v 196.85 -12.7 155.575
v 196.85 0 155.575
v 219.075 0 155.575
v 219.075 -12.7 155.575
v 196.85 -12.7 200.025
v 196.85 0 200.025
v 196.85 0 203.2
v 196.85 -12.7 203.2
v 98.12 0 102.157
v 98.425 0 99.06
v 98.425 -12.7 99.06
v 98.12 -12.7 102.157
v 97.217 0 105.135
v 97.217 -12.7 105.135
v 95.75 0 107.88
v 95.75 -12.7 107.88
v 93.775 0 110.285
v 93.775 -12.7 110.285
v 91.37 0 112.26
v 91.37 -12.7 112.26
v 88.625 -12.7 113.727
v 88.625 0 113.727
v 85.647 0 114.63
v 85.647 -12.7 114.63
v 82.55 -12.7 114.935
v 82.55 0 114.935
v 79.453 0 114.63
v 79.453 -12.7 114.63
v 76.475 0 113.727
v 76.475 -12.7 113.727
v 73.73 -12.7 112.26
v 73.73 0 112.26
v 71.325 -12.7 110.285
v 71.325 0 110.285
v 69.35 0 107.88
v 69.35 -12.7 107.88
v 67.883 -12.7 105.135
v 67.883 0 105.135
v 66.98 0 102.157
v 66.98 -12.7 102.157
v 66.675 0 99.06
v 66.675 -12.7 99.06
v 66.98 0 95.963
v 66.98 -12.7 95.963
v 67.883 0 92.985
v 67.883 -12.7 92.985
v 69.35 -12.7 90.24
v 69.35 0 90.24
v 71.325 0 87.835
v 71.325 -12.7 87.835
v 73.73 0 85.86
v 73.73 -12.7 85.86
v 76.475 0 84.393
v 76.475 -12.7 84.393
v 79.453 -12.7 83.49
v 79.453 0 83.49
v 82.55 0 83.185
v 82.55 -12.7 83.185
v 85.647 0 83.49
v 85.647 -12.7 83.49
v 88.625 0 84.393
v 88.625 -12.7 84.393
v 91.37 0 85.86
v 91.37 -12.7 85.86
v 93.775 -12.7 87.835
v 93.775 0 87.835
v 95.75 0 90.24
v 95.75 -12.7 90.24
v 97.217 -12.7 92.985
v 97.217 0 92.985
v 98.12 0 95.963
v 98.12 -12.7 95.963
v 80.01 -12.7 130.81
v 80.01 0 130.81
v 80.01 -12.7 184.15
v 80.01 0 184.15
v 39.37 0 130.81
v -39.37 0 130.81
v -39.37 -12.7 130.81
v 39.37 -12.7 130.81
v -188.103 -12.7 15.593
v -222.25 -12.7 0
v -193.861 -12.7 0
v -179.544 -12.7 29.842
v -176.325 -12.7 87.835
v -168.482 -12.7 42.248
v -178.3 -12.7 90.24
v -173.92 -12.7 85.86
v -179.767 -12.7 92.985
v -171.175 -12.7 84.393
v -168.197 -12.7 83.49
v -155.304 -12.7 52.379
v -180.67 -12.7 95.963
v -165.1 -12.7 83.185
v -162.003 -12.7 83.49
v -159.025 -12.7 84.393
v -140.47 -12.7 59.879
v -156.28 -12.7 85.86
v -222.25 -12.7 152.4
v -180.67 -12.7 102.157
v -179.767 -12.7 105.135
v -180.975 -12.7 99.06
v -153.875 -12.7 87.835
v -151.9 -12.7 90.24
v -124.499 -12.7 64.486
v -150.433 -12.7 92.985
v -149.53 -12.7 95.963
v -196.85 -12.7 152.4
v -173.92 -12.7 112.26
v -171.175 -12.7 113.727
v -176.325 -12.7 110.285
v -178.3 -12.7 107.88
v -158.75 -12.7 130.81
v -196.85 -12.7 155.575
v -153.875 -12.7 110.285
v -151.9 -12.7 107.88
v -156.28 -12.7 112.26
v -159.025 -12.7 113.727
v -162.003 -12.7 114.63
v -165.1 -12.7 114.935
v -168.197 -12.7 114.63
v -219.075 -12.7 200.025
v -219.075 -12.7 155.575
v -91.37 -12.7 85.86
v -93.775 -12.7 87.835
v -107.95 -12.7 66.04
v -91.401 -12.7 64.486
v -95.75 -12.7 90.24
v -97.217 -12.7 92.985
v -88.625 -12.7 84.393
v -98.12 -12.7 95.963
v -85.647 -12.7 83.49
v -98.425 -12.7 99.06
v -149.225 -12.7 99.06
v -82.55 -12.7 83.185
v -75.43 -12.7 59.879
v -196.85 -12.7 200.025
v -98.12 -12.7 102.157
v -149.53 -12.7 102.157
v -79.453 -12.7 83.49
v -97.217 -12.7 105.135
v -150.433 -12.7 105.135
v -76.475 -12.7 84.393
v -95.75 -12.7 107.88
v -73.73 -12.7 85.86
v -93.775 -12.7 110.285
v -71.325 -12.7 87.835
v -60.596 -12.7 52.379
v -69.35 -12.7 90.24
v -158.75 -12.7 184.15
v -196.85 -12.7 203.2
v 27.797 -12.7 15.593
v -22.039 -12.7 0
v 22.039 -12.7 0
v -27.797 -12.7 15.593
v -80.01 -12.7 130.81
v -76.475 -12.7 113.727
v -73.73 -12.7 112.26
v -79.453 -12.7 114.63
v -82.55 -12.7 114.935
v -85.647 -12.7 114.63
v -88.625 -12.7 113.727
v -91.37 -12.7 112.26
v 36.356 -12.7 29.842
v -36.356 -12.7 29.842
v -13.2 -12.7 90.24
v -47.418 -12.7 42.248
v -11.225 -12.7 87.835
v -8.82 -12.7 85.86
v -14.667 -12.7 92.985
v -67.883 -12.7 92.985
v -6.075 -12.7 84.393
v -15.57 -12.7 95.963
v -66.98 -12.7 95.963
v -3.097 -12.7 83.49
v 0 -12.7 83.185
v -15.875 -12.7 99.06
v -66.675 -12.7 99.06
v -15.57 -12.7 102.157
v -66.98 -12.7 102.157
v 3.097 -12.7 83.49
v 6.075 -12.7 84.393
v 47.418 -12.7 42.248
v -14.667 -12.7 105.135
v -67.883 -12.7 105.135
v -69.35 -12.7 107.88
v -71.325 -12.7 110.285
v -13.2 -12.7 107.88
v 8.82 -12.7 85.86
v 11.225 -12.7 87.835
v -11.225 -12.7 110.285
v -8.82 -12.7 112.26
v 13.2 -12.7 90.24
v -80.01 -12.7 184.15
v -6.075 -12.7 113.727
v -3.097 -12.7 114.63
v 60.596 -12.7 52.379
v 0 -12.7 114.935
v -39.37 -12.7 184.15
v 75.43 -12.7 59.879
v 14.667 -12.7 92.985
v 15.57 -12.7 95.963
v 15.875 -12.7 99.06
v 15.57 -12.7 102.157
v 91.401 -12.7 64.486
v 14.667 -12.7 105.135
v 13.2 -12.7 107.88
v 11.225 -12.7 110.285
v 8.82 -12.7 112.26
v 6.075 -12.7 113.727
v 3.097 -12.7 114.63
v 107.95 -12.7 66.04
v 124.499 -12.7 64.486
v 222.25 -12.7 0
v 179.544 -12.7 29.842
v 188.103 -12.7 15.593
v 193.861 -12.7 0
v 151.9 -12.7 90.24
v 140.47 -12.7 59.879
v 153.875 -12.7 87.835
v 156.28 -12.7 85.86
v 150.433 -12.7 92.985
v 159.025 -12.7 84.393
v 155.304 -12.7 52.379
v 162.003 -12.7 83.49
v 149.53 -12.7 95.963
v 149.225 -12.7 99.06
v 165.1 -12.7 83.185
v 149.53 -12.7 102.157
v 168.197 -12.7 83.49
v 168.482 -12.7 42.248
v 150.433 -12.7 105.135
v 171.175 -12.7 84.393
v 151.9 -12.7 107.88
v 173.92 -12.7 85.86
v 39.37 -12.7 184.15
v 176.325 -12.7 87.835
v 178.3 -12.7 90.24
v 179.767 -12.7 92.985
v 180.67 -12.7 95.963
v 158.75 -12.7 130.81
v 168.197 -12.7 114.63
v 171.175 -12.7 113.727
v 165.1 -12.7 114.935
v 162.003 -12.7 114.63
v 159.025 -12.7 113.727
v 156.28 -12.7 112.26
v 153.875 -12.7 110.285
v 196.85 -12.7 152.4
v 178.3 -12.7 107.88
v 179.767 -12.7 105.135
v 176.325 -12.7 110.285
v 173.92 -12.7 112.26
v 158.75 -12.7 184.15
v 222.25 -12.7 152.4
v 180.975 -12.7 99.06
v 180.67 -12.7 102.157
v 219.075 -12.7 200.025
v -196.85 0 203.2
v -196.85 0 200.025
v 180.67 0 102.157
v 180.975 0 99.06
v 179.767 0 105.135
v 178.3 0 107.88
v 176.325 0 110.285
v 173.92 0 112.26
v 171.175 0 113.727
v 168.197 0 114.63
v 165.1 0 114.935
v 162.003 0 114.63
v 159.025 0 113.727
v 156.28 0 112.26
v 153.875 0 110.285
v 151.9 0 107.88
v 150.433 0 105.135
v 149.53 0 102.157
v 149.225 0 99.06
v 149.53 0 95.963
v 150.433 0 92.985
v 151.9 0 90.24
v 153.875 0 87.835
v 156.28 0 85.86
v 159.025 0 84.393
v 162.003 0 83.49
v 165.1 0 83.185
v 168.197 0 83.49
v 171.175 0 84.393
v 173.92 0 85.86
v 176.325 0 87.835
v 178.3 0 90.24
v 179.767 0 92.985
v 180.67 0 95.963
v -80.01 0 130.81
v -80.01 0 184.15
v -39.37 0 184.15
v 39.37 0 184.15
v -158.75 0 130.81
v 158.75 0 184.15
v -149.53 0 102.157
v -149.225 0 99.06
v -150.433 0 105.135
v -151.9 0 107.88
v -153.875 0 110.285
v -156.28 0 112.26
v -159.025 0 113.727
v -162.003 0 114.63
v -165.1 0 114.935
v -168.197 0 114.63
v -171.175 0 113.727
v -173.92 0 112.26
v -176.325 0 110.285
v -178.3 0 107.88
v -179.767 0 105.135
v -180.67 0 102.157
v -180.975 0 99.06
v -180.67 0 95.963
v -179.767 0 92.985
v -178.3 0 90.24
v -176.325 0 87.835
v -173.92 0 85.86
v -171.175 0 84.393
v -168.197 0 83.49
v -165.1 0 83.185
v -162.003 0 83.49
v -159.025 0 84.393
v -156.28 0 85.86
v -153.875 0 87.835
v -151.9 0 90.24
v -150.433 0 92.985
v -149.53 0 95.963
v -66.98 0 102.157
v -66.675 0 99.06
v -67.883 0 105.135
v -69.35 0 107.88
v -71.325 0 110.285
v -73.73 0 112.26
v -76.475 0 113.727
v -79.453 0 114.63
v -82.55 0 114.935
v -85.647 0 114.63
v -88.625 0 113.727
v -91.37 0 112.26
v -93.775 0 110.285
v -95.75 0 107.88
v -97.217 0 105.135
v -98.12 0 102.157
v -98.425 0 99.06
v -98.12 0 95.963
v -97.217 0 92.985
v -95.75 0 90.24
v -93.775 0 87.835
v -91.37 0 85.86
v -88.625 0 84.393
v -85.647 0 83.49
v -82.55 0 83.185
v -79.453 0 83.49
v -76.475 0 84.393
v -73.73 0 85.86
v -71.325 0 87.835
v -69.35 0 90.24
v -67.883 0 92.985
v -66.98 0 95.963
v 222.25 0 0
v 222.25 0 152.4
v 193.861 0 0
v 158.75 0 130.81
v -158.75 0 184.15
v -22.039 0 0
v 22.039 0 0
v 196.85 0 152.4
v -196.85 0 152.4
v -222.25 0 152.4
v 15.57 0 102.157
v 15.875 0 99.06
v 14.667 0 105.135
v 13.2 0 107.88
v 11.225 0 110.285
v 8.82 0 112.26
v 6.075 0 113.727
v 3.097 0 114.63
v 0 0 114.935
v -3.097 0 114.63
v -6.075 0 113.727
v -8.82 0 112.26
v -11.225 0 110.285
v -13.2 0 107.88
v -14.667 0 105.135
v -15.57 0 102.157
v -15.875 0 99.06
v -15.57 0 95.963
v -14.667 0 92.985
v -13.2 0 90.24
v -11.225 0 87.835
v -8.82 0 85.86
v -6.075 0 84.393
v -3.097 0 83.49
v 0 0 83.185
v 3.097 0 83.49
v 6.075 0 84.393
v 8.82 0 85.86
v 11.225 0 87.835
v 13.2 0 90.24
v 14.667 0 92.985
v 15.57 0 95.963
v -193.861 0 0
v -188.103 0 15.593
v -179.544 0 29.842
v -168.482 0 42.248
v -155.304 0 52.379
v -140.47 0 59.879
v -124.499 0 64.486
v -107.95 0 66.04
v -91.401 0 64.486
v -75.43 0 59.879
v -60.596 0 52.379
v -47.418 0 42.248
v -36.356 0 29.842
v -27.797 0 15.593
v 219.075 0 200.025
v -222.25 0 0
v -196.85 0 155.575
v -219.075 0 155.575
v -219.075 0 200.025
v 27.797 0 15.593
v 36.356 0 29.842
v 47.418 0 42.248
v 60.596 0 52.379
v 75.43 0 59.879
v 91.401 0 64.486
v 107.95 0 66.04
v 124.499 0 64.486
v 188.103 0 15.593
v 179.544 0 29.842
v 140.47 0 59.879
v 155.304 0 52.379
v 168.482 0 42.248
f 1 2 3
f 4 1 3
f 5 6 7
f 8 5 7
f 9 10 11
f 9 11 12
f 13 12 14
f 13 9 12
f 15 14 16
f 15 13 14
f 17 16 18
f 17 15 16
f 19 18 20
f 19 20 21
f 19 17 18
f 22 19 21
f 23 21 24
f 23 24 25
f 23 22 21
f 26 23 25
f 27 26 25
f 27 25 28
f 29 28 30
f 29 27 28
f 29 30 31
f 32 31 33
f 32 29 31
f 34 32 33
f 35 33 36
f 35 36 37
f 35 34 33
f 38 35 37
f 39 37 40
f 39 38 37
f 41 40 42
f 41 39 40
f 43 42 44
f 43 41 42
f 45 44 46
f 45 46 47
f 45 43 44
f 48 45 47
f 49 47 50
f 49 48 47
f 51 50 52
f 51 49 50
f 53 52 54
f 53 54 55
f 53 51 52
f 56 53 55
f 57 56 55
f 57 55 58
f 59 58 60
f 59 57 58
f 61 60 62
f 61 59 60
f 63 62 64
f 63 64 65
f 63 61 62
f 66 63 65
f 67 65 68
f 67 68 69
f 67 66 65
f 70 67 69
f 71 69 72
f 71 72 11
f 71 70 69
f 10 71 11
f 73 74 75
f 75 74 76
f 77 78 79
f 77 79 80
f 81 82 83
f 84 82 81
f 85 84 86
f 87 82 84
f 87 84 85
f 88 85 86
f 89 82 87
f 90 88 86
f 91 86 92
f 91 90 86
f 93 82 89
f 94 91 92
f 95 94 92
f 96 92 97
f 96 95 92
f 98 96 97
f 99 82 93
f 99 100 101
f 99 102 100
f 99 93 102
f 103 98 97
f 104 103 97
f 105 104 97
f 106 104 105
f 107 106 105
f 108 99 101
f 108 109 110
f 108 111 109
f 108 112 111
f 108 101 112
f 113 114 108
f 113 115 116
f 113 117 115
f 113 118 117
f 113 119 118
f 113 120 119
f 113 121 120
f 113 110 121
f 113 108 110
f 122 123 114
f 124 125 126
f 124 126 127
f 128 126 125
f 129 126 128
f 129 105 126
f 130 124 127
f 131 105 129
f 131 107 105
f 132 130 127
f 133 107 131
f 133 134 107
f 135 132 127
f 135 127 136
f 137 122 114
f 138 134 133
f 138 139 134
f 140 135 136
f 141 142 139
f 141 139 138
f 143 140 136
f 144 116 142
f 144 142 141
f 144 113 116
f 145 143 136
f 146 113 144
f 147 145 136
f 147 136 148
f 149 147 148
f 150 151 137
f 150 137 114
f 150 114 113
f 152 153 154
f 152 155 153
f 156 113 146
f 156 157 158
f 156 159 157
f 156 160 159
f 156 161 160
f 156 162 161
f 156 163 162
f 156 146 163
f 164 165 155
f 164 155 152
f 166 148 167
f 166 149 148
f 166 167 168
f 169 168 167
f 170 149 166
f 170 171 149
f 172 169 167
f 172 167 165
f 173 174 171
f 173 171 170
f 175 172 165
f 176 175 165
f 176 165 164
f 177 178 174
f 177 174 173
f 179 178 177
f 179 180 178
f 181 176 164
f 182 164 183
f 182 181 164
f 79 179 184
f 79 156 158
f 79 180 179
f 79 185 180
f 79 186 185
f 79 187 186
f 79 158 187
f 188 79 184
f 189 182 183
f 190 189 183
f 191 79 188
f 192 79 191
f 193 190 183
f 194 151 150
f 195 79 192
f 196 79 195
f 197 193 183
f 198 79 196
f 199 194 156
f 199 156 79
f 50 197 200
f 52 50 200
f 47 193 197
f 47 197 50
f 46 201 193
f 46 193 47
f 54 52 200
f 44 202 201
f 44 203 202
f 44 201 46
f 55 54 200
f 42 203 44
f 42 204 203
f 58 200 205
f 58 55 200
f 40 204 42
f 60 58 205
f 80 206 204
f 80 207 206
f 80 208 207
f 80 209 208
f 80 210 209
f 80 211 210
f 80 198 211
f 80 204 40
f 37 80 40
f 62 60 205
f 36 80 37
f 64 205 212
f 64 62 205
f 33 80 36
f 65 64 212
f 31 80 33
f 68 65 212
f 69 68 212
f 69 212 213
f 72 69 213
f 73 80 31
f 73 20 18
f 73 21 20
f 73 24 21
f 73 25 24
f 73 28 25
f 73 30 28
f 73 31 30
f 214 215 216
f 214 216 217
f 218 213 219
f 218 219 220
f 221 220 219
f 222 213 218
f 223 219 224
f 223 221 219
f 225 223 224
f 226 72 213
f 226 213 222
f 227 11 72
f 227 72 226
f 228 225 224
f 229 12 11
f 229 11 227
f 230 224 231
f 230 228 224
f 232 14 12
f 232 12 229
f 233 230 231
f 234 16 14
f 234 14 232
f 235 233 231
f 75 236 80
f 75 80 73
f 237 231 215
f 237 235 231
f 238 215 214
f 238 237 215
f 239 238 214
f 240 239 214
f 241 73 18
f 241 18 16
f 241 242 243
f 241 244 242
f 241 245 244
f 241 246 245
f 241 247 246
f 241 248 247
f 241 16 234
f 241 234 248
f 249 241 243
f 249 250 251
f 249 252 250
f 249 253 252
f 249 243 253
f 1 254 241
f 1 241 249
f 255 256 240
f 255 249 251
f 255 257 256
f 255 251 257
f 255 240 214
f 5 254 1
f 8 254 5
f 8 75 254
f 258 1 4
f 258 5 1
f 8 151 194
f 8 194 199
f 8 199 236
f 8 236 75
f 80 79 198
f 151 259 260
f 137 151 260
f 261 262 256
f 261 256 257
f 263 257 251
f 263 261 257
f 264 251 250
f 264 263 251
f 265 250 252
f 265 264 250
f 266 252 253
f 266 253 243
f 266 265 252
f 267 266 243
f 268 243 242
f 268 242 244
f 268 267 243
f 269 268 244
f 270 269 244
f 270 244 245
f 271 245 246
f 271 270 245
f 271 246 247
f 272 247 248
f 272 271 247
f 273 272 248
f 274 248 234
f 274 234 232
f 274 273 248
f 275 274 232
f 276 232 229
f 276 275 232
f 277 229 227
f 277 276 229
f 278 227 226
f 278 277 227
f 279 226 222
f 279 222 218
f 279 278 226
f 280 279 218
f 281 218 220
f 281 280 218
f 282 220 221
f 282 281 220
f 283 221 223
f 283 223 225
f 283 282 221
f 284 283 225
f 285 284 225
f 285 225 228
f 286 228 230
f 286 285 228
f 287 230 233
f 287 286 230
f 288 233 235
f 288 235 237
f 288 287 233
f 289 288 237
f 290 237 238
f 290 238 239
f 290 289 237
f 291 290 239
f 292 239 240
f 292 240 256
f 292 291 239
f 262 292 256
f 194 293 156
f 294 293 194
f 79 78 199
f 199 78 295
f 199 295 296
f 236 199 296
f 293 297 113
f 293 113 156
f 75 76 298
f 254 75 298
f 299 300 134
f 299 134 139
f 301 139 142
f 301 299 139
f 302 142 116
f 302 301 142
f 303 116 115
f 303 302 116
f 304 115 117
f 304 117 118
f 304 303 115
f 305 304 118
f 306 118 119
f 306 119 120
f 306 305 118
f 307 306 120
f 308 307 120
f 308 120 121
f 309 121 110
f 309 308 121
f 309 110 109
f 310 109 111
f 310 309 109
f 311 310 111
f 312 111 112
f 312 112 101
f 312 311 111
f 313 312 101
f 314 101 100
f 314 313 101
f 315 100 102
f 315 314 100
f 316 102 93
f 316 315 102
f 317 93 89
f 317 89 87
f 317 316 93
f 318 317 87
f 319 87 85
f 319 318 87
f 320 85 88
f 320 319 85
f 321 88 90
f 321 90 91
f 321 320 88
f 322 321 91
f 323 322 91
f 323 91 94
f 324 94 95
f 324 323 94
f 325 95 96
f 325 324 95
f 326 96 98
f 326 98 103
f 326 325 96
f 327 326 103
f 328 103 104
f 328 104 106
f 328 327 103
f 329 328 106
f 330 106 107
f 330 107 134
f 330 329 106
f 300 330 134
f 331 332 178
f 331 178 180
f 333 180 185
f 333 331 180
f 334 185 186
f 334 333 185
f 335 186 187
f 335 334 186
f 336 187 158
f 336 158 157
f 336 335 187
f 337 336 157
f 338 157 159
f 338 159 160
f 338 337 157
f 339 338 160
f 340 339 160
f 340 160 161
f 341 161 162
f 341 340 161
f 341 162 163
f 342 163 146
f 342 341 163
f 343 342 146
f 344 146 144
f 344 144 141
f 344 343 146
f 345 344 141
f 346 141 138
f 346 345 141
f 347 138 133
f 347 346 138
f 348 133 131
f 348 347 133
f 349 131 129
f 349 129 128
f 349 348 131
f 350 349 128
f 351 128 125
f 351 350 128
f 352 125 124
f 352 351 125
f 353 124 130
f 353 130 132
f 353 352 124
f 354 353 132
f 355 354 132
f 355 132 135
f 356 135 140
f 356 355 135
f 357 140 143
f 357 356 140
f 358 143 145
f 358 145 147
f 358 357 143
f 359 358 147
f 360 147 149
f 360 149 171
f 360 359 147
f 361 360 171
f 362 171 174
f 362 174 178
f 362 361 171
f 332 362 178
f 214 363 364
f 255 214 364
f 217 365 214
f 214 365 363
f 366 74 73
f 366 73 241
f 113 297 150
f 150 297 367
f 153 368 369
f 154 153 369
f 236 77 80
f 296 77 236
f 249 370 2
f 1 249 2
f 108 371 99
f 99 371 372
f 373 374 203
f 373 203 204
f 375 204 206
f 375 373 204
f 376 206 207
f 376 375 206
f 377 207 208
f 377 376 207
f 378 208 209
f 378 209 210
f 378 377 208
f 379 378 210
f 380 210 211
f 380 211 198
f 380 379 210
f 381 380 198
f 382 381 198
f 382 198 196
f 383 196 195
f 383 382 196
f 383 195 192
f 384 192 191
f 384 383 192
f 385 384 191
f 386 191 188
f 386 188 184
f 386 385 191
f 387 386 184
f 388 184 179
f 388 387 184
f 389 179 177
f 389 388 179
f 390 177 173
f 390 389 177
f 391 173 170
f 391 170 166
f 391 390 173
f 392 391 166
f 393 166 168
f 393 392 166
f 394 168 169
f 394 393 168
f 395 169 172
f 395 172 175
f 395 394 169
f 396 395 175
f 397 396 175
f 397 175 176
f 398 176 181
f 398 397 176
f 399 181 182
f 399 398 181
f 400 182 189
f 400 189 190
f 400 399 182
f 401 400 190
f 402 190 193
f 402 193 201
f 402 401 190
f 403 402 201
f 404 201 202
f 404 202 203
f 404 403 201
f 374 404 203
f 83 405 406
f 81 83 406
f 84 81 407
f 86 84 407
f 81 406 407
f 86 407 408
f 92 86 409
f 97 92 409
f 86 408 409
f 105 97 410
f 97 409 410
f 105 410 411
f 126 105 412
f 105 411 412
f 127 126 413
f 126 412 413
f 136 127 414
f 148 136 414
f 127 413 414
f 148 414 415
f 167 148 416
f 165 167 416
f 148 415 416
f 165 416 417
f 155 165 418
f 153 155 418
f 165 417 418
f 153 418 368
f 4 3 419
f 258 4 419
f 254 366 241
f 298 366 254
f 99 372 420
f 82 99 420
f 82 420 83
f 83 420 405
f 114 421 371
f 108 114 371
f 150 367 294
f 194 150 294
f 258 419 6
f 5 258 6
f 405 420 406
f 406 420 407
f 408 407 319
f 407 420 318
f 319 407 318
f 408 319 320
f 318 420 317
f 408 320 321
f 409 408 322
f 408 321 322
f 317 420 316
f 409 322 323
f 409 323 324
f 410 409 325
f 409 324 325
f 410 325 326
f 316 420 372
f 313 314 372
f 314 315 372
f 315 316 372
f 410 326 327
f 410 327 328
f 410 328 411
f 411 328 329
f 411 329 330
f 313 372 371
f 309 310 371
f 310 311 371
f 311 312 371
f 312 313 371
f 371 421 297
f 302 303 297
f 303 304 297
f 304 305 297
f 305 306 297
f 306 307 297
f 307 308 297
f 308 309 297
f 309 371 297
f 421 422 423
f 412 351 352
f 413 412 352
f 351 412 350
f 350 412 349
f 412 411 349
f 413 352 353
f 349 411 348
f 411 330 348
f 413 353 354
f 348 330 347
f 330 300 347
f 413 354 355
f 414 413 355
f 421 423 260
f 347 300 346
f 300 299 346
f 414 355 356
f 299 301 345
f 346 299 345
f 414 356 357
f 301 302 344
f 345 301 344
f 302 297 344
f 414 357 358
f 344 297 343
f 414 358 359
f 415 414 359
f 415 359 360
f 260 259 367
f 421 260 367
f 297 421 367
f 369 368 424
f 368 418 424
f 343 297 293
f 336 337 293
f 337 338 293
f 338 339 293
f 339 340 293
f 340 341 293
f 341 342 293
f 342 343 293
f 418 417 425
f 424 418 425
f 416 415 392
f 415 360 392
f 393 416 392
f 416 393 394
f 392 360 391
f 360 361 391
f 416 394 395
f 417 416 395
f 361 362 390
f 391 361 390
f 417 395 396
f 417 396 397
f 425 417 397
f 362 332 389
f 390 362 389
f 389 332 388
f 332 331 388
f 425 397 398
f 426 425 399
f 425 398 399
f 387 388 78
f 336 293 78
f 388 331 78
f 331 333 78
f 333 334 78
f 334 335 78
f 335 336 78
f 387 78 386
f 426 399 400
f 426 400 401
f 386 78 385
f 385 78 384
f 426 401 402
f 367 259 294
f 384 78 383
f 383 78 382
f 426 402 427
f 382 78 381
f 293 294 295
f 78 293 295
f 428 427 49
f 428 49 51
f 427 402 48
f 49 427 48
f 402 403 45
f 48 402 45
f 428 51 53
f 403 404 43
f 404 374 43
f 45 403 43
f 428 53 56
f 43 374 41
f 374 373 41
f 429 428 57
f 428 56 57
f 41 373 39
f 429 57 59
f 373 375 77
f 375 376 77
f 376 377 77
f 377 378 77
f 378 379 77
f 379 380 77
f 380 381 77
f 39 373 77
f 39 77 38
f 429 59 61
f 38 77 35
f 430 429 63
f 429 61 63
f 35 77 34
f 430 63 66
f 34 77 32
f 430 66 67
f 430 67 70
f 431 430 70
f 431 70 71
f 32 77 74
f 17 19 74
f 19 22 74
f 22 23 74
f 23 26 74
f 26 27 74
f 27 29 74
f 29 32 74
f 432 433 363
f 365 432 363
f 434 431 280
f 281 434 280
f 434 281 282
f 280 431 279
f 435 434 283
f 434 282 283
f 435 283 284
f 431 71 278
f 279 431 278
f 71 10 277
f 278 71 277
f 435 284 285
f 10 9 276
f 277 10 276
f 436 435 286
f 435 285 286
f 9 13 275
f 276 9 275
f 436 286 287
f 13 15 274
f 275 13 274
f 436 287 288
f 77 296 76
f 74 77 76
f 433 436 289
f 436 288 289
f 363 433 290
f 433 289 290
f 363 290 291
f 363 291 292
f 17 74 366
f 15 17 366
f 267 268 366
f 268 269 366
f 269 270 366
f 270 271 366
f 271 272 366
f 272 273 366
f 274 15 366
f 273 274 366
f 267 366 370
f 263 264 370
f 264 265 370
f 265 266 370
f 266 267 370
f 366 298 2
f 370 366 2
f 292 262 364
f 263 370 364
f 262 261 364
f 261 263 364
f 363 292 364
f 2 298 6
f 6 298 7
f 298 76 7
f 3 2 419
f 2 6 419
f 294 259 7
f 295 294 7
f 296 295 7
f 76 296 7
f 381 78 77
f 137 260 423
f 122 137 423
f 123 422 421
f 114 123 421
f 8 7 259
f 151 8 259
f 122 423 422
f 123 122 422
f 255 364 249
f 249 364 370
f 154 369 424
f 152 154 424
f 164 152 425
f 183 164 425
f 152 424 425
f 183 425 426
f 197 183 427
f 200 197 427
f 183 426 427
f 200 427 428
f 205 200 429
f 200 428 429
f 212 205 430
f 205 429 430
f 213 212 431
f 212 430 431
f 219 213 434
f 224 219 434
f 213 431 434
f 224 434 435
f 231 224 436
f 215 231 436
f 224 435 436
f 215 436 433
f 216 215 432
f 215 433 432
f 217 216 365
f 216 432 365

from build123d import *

# Parameters (mm, degrees)
F0_R     = 15.875
F0_W     = 78.74
F0_H     = 53.34
F1_DEPTH = 12.7


with BuildPart() as f1:
    # F0 (on Front) → F1 (new body)
    with BuildSketch(Plane.XZ):
        with BuildLine():
            Line((-22.039405, 0), (22.039405, 0))
            ThreePointArc((22.039405, 0), (107.95, 66.04), (193.860595, 0))
            Line((193.860595, 0), (222.25, 0))
            Line((222.25, 0), (222.25, 152.4))
            Line((222.25, 152.4), (196.85, 152.4))
            Line((196.85, 152.4), (196.85, 155.575))
            Line((196.85, 155.575), (219.075, 155.575))
            Line((219.075, 155.575), (219.075, 200.025))
            Line((219.075, 200.025), (196.85, 200.025))
            Line((196.85, 200.025), (196.85, 203.2))
            Line((196.85, 203.2), (-196.85, 203.2))
            Line((-196.85, 203.2), (-196.85, 200.025))
            Line((-196.85, 200.025), (-219.075, 200.025))
            Line((-219.075, 200.025), (-219.075, 155.575))
            Line((-219.075, 155.575), (-196.85, 155.575))
            Line((-196.85, 155.575), (-196.85, 152.4))
            Line((-196.85, 152.4), (-222.25, 152.4))
            Line((-222.25, 152.4), (-222.25, 0))
            Line((-222.25, 0), (-193.860595, 0))
            ThreePointArc((-193.860595, 0), (-107.95, 66.04), (-22.039405, 0))
        make_face()
        with Locations((-165.1, 99.06)):
            Circle(F0_R, mode=Mode.SUBTRACT)
        with Locations((-82.55, 99.06)):
            Circle(F0_R, mode=Mode.SUBTRACT)
        with Locations((0, 99.06)):
            Circle(F0_R, mode=Mode.SUBTRACT)
        with Locations((82.55, 99.06)):
            Circle(F0_R, mode=Mode.SUBTRACT)
        with Locations((165.1, 99.06)):
            Circle(F0_R, mode=Mode.SUBTRACT)
        with Locations((-119.38, 157.48)):
            Rectangle(F0_W, F0_H, mode=Mode.SUBTRACT)
        with Locations((0, 157.48)):
            Rectangle(F0_W, F0_H, mode=Mode.SUBTRACT)
        with Locations((119.38, 157.48)):
            Rectangle(F0_W, F0_H, mode=Mode.SUBTRACT)
    extrude(amount=F1_DEPTH)


solid = f1.part
